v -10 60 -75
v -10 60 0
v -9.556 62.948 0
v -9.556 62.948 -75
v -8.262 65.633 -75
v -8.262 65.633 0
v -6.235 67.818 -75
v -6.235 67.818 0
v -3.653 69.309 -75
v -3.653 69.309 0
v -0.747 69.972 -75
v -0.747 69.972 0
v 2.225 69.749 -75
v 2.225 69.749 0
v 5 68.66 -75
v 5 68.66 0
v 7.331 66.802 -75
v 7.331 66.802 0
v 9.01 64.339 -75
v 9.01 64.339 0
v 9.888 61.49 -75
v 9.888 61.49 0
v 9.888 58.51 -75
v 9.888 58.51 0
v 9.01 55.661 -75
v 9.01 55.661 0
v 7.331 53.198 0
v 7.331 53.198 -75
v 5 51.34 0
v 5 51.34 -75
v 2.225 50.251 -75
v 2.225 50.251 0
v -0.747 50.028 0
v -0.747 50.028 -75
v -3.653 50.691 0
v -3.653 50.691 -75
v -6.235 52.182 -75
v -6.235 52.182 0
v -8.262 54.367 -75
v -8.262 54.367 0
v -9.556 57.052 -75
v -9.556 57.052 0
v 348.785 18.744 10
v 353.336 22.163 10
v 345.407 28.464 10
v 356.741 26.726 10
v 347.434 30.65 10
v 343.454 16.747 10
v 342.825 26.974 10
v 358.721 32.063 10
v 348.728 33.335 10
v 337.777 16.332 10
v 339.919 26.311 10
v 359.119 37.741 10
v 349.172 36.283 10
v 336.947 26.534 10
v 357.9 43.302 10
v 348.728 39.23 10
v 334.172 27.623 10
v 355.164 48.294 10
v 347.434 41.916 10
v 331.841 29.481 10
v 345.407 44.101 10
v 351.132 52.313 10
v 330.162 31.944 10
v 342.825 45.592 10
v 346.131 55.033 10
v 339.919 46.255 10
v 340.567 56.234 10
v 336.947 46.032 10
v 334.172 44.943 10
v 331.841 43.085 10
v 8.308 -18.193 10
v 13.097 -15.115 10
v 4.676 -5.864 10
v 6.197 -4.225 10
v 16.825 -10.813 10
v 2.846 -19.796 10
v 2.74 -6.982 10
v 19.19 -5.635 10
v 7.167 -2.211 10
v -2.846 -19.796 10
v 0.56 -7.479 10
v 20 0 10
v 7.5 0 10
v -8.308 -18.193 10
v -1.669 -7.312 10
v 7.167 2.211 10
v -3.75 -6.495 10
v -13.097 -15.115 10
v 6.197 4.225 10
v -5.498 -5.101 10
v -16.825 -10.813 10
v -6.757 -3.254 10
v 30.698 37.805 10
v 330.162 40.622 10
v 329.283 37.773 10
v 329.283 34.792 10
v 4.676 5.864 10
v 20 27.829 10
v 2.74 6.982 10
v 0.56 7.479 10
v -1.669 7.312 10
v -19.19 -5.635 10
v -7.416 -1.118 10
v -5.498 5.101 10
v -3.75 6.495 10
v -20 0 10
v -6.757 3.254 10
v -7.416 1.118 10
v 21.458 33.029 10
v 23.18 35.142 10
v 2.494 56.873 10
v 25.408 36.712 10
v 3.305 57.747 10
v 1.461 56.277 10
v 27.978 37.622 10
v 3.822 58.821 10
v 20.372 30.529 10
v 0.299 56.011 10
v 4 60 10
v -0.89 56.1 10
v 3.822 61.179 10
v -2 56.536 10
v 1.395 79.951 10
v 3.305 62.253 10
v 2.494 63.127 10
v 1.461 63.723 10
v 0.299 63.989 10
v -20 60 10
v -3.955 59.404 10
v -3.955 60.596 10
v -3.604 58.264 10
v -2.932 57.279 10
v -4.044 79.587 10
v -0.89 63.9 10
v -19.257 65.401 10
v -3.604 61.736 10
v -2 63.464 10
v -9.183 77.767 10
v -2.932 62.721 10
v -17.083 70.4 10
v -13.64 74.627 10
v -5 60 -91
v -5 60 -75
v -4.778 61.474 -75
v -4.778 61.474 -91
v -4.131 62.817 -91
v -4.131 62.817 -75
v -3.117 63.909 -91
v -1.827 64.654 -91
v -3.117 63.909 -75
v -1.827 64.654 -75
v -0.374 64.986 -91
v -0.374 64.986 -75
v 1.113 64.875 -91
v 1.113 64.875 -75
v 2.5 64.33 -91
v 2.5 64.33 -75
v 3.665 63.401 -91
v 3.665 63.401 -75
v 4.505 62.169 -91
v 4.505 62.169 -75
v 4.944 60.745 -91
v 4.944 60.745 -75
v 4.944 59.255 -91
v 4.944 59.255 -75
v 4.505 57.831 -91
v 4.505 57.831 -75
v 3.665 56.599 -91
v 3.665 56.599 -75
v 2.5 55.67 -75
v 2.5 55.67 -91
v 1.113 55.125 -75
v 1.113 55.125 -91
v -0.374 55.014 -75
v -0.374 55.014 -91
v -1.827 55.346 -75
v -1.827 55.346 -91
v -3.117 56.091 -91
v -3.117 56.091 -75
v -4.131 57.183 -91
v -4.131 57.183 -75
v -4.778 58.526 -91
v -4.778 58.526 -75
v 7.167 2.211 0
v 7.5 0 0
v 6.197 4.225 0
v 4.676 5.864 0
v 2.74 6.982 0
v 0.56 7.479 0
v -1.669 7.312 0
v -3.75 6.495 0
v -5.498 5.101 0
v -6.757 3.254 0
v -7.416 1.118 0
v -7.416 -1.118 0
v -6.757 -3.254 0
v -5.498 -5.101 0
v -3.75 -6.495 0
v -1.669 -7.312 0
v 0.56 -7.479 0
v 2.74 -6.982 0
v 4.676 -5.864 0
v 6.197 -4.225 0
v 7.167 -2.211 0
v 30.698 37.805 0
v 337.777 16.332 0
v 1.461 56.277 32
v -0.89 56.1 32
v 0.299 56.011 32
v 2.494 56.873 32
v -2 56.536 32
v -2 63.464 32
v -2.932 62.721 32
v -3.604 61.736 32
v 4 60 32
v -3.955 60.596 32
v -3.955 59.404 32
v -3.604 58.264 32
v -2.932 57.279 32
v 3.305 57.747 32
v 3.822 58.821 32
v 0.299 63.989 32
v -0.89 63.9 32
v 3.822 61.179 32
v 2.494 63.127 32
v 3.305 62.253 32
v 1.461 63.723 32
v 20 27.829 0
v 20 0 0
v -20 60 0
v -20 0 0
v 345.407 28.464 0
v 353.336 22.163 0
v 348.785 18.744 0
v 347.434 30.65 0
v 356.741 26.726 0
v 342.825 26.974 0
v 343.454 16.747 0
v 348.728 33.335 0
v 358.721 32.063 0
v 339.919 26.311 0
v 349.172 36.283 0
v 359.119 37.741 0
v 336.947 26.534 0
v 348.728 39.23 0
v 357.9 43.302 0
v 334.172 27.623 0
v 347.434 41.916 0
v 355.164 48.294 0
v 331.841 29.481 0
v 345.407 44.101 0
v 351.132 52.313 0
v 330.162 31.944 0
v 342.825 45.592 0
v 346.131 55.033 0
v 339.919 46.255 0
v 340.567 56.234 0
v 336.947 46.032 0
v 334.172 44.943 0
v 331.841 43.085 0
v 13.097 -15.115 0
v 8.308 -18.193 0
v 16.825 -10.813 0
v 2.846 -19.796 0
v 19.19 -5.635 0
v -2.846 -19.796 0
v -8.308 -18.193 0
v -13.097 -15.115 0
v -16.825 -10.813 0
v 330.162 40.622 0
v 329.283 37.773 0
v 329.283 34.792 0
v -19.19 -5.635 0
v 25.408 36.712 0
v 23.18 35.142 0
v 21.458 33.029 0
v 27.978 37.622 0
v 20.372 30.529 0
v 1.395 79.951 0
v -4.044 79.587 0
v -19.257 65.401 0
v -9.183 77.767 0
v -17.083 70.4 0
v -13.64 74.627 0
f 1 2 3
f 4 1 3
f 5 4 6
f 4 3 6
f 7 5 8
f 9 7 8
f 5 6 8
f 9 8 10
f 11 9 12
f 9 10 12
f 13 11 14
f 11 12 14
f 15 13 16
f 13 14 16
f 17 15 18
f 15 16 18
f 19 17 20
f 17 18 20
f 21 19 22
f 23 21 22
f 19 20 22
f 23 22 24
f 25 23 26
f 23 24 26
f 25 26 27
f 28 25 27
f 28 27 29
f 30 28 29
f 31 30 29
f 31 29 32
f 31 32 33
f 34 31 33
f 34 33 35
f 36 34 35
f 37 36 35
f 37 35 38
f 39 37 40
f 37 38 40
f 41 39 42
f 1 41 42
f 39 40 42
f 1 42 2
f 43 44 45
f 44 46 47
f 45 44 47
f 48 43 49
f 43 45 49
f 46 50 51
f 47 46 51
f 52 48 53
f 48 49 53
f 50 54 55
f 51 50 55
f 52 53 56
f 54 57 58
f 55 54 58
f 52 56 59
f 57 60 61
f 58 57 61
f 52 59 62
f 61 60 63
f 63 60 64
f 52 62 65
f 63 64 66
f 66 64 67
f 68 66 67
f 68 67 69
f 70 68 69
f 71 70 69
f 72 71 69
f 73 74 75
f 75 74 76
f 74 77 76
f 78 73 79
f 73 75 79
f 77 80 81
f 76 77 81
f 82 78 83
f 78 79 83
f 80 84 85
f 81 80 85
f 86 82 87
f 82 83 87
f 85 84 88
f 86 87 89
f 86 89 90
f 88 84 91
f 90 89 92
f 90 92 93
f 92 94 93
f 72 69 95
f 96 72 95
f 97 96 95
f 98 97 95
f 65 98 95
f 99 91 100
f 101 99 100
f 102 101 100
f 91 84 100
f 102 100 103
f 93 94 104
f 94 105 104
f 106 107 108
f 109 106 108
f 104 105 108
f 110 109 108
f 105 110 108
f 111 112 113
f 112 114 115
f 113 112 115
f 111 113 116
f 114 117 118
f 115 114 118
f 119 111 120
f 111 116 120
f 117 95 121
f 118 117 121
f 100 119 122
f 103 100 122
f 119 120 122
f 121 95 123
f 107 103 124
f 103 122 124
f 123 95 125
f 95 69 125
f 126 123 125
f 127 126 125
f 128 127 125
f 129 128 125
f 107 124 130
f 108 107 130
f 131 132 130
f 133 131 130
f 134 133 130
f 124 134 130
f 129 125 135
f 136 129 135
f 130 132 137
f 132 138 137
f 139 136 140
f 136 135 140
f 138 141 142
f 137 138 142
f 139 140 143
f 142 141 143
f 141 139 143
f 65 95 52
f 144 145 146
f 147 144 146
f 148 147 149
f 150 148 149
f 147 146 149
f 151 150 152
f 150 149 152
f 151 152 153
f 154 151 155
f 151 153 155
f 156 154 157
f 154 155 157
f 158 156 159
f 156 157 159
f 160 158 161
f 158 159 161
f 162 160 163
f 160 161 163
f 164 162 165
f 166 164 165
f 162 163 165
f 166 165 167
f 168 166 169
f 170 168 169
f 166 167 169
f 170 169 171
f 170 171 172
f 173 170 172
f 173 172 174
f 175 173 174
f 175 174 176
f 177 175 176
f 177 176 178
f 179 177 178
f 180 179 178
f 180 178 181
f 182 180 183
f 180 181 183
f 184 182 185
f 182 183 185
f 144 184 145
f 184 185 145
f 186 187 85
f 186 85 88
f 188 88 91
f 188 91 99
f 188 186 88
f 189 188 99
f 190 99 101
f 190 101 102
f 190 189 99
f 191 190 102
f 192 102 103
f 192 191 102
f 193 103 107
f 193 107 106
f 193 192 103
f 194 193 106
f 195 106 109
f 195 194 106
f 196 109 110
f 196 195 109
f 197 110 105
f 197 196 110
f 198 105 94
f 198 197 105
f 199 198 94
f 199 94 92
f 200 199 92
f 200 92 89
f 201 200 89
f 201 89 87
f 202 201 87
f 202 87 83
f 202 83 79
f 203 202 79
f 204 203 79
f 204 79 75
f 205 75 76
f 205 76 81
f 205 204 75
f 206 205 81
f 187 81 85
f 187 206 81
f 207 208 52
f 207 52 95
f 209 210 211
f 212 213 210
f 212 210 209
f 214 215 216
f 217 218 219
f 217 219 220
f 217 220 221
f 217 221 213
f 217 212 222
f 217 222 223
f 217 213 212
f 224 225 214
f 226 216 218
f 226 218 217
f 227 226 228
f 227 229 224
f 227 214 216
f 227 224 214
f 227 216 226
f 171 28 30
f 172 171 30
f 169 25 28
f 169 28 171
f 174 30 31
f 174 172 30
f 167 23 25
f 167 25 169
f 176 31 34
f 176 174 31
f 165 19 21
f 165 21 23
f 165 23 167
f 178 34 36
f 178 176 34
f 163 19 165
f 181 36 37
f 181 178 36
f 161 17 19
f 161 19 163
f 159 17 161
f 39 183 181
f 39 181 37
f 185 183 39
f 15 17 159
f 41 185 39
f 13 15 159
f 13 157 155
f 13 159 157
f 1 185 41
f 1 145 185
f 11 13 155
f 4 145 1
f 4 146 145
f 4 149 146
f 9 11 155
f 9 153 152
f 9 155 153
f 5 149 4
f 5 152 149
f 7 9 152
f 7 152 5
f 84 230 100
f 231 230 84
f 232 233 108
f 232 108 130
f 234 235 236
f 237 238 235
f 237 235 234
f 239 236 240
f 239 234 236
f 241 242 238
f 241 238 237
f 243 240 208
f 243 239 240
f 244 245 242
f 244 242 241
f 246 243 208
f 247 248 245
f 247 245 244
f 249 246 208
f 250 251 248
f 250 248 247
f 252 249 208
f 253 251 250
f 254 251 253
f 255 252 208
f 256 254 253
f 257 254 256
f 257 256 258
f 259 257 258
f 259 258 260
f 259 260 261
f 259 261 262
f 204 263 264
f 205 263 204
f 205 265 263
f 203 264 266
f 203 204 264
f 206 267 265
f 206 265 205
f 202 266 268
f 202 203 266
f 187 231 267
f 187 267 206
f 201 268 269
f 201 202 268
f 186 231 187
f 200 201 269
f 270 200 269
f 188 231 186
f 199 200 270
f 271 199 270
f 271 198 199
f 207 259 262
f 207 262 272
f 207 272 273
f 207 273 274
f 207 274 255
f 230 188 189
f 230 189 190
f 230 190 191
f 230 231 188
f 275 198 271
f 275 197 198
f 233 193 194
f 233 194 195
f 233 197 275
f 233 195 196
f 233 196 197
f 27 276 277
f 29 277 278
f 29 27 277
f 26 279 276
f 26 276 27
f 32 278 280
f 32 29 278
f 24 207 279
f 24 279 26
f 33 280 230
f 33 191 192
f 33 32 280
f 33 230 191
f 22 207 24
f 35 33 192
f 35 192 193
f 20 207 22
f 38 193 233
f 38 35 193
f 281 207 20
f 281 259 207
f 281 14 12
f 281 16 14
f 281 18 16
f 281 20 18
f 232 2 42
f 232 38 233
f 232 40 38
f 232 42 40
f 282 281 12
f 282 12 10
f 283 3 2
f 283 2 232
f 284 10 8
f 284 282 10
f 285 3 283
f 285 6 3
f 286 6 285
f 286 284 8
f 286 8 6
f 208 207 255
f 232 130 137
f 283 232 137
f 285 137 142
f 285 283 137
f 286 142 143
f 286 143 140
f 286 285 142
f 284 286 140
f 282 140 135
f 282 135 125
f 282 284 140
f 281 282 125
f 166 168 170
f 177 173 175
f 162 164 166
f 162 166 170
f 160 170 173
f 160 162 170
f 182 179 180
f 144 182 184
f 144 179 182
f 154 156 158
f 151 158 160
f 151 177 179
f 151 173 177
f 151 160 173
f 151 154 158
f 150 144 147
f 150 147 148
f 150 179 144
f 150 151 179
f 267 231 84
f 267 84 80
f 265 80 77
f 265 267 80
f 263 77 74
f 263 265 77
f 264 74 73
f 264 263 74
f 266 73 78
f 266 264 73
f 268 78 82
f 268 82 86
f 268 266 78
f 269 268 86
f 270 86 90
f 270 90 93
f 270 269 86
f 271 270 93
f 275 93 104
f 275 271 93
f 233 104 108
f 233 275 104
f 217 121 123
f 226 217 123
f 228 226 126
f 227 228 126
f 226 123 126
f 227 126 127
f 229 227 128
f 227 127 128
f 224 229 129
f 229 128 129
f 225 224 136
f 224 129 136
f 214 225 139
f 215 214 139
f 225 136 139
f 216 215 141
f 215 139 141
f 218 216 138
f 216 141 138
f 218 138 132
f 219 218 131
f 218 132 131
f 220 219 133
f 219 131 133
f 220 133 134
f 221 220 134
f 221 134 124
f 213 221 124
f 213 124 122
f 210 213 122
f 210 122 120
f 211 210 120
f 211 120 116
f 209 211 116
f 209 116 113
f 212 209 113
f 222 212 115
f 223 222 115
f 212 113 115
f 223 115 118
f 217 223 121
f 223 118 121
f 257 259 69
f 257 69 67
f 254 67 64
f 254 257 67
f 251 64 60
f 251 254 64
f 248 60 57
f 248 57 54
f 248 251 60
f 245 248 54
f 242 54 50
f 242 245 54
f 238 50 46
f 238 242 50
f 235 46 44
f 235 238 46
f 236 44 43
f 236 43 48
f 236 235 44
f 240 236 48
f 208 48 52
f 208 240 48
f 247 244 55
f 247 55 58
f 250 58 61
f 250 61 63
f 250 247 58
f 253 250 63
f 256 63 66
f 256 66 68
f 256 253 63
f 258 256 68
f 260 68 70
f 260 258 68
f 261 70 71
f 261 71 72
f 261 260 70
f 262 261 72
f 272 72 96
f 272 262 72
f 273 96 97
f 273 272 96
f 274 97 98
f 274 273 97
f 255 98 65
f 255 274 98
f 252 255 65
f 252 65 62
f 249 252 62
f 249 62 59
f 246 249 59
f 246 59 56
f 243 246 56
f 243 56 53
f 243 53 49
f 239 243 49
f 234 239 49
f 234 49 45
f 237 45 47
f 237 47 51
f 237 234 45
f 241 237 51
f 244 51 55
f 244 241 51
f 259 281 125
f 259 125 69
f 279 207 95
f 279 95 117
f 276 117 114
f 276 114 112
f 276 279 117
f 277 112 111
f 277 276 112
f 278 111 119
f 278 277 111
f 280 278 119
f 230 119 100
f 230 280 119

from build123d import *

# Parameters (mm, degrees)
CROQUIS1_R              = 7.5
CROQUIS1_R_2            = 10
SALIENTE_EXTRUIR1_DEPTH = 10
CROQUIS2_R              = 10
SALIENTE_EXTRUIR2_DEPTH = 75
CROQUIS3_R              = 5
SALIENTE_EXTRUIR3_DEPTH = 16
CROQUIS4_R              = 4
SALIENTE_EXTRUIR4_DEPTH = 22


with BuildPart() as part:
    # Croquis1 → Saliente-Extruir1 (new body)
    with BuildSketch(Plane.XY):
        with BuildLine():
            Line((-20, 0), (-20, 60))
            ThreePointArc((-20, 60), (-13.639967201, 74.627074032), (1.395129475, 79.951281005))
            Line((1.395129475, 79.951281005), (340.566906563, 56.234079932))
            ThreePointArc((340.566906563, 56.234079932), (359.123058094, 34.887669452), (337.776647613, 16.331517922))
            Line((337.776647613, 16.331517922), (30.697564737, 37.804579202))
            ThreePointArc((30.697564737, 37.804579202), (23.180016399, 35.142475715), (20, 27.828938699))
            Line((20, 27.828938699), (20, 0))
            ThreePointArc((20, 0), (0, -20), (-20, 0))
        make_face()
        Circle(CROQUIS1_R, mode=Mode.SUBTRACT)
        with Locations((339.171777088, 36.282798927)):
            Circle(CROQUIS1_R_2, mode=Mode.SUBTRACT)
    extrude(amount=SALIENTE_EXTRUIR1_DEPTH)

    # Croquis2 → Saliente-Extruir2 (add)
    with BuildSketch(Plane(origin=(0, 0, 0), x_dir=(-1, 0, 0), z_dir=(0, 0, -1))):
        with Locations((0, 60)):
            Circle(CROQUIS2_R)
    extrude(amount=SALIENTE_EXTRUIR2_DEPTH)

    # Croquis3 → Saliente-Extruir3 (add)
    with BuildSketch(Plane(origin=(0, 0, -75), x_dir=(-1, 0, 0), z_dir=(0, 0, -1))):
        with Locations((0, 60)):
            Circle(CROQUIS3_R)
    extrude(amount=SALIENTE_EXTRUIR3_DEPTH)

    # Croquis4 → Saliente-Extruir4 (add)
    with BuildSketch(Plane.XY.offset(10)):
        with Locations((0, 60)):
            Circle(CROQUIS4_R)
    extrude(amount=SALIENTE_EXTRUIR4_DEPTH)


solid = part.part
